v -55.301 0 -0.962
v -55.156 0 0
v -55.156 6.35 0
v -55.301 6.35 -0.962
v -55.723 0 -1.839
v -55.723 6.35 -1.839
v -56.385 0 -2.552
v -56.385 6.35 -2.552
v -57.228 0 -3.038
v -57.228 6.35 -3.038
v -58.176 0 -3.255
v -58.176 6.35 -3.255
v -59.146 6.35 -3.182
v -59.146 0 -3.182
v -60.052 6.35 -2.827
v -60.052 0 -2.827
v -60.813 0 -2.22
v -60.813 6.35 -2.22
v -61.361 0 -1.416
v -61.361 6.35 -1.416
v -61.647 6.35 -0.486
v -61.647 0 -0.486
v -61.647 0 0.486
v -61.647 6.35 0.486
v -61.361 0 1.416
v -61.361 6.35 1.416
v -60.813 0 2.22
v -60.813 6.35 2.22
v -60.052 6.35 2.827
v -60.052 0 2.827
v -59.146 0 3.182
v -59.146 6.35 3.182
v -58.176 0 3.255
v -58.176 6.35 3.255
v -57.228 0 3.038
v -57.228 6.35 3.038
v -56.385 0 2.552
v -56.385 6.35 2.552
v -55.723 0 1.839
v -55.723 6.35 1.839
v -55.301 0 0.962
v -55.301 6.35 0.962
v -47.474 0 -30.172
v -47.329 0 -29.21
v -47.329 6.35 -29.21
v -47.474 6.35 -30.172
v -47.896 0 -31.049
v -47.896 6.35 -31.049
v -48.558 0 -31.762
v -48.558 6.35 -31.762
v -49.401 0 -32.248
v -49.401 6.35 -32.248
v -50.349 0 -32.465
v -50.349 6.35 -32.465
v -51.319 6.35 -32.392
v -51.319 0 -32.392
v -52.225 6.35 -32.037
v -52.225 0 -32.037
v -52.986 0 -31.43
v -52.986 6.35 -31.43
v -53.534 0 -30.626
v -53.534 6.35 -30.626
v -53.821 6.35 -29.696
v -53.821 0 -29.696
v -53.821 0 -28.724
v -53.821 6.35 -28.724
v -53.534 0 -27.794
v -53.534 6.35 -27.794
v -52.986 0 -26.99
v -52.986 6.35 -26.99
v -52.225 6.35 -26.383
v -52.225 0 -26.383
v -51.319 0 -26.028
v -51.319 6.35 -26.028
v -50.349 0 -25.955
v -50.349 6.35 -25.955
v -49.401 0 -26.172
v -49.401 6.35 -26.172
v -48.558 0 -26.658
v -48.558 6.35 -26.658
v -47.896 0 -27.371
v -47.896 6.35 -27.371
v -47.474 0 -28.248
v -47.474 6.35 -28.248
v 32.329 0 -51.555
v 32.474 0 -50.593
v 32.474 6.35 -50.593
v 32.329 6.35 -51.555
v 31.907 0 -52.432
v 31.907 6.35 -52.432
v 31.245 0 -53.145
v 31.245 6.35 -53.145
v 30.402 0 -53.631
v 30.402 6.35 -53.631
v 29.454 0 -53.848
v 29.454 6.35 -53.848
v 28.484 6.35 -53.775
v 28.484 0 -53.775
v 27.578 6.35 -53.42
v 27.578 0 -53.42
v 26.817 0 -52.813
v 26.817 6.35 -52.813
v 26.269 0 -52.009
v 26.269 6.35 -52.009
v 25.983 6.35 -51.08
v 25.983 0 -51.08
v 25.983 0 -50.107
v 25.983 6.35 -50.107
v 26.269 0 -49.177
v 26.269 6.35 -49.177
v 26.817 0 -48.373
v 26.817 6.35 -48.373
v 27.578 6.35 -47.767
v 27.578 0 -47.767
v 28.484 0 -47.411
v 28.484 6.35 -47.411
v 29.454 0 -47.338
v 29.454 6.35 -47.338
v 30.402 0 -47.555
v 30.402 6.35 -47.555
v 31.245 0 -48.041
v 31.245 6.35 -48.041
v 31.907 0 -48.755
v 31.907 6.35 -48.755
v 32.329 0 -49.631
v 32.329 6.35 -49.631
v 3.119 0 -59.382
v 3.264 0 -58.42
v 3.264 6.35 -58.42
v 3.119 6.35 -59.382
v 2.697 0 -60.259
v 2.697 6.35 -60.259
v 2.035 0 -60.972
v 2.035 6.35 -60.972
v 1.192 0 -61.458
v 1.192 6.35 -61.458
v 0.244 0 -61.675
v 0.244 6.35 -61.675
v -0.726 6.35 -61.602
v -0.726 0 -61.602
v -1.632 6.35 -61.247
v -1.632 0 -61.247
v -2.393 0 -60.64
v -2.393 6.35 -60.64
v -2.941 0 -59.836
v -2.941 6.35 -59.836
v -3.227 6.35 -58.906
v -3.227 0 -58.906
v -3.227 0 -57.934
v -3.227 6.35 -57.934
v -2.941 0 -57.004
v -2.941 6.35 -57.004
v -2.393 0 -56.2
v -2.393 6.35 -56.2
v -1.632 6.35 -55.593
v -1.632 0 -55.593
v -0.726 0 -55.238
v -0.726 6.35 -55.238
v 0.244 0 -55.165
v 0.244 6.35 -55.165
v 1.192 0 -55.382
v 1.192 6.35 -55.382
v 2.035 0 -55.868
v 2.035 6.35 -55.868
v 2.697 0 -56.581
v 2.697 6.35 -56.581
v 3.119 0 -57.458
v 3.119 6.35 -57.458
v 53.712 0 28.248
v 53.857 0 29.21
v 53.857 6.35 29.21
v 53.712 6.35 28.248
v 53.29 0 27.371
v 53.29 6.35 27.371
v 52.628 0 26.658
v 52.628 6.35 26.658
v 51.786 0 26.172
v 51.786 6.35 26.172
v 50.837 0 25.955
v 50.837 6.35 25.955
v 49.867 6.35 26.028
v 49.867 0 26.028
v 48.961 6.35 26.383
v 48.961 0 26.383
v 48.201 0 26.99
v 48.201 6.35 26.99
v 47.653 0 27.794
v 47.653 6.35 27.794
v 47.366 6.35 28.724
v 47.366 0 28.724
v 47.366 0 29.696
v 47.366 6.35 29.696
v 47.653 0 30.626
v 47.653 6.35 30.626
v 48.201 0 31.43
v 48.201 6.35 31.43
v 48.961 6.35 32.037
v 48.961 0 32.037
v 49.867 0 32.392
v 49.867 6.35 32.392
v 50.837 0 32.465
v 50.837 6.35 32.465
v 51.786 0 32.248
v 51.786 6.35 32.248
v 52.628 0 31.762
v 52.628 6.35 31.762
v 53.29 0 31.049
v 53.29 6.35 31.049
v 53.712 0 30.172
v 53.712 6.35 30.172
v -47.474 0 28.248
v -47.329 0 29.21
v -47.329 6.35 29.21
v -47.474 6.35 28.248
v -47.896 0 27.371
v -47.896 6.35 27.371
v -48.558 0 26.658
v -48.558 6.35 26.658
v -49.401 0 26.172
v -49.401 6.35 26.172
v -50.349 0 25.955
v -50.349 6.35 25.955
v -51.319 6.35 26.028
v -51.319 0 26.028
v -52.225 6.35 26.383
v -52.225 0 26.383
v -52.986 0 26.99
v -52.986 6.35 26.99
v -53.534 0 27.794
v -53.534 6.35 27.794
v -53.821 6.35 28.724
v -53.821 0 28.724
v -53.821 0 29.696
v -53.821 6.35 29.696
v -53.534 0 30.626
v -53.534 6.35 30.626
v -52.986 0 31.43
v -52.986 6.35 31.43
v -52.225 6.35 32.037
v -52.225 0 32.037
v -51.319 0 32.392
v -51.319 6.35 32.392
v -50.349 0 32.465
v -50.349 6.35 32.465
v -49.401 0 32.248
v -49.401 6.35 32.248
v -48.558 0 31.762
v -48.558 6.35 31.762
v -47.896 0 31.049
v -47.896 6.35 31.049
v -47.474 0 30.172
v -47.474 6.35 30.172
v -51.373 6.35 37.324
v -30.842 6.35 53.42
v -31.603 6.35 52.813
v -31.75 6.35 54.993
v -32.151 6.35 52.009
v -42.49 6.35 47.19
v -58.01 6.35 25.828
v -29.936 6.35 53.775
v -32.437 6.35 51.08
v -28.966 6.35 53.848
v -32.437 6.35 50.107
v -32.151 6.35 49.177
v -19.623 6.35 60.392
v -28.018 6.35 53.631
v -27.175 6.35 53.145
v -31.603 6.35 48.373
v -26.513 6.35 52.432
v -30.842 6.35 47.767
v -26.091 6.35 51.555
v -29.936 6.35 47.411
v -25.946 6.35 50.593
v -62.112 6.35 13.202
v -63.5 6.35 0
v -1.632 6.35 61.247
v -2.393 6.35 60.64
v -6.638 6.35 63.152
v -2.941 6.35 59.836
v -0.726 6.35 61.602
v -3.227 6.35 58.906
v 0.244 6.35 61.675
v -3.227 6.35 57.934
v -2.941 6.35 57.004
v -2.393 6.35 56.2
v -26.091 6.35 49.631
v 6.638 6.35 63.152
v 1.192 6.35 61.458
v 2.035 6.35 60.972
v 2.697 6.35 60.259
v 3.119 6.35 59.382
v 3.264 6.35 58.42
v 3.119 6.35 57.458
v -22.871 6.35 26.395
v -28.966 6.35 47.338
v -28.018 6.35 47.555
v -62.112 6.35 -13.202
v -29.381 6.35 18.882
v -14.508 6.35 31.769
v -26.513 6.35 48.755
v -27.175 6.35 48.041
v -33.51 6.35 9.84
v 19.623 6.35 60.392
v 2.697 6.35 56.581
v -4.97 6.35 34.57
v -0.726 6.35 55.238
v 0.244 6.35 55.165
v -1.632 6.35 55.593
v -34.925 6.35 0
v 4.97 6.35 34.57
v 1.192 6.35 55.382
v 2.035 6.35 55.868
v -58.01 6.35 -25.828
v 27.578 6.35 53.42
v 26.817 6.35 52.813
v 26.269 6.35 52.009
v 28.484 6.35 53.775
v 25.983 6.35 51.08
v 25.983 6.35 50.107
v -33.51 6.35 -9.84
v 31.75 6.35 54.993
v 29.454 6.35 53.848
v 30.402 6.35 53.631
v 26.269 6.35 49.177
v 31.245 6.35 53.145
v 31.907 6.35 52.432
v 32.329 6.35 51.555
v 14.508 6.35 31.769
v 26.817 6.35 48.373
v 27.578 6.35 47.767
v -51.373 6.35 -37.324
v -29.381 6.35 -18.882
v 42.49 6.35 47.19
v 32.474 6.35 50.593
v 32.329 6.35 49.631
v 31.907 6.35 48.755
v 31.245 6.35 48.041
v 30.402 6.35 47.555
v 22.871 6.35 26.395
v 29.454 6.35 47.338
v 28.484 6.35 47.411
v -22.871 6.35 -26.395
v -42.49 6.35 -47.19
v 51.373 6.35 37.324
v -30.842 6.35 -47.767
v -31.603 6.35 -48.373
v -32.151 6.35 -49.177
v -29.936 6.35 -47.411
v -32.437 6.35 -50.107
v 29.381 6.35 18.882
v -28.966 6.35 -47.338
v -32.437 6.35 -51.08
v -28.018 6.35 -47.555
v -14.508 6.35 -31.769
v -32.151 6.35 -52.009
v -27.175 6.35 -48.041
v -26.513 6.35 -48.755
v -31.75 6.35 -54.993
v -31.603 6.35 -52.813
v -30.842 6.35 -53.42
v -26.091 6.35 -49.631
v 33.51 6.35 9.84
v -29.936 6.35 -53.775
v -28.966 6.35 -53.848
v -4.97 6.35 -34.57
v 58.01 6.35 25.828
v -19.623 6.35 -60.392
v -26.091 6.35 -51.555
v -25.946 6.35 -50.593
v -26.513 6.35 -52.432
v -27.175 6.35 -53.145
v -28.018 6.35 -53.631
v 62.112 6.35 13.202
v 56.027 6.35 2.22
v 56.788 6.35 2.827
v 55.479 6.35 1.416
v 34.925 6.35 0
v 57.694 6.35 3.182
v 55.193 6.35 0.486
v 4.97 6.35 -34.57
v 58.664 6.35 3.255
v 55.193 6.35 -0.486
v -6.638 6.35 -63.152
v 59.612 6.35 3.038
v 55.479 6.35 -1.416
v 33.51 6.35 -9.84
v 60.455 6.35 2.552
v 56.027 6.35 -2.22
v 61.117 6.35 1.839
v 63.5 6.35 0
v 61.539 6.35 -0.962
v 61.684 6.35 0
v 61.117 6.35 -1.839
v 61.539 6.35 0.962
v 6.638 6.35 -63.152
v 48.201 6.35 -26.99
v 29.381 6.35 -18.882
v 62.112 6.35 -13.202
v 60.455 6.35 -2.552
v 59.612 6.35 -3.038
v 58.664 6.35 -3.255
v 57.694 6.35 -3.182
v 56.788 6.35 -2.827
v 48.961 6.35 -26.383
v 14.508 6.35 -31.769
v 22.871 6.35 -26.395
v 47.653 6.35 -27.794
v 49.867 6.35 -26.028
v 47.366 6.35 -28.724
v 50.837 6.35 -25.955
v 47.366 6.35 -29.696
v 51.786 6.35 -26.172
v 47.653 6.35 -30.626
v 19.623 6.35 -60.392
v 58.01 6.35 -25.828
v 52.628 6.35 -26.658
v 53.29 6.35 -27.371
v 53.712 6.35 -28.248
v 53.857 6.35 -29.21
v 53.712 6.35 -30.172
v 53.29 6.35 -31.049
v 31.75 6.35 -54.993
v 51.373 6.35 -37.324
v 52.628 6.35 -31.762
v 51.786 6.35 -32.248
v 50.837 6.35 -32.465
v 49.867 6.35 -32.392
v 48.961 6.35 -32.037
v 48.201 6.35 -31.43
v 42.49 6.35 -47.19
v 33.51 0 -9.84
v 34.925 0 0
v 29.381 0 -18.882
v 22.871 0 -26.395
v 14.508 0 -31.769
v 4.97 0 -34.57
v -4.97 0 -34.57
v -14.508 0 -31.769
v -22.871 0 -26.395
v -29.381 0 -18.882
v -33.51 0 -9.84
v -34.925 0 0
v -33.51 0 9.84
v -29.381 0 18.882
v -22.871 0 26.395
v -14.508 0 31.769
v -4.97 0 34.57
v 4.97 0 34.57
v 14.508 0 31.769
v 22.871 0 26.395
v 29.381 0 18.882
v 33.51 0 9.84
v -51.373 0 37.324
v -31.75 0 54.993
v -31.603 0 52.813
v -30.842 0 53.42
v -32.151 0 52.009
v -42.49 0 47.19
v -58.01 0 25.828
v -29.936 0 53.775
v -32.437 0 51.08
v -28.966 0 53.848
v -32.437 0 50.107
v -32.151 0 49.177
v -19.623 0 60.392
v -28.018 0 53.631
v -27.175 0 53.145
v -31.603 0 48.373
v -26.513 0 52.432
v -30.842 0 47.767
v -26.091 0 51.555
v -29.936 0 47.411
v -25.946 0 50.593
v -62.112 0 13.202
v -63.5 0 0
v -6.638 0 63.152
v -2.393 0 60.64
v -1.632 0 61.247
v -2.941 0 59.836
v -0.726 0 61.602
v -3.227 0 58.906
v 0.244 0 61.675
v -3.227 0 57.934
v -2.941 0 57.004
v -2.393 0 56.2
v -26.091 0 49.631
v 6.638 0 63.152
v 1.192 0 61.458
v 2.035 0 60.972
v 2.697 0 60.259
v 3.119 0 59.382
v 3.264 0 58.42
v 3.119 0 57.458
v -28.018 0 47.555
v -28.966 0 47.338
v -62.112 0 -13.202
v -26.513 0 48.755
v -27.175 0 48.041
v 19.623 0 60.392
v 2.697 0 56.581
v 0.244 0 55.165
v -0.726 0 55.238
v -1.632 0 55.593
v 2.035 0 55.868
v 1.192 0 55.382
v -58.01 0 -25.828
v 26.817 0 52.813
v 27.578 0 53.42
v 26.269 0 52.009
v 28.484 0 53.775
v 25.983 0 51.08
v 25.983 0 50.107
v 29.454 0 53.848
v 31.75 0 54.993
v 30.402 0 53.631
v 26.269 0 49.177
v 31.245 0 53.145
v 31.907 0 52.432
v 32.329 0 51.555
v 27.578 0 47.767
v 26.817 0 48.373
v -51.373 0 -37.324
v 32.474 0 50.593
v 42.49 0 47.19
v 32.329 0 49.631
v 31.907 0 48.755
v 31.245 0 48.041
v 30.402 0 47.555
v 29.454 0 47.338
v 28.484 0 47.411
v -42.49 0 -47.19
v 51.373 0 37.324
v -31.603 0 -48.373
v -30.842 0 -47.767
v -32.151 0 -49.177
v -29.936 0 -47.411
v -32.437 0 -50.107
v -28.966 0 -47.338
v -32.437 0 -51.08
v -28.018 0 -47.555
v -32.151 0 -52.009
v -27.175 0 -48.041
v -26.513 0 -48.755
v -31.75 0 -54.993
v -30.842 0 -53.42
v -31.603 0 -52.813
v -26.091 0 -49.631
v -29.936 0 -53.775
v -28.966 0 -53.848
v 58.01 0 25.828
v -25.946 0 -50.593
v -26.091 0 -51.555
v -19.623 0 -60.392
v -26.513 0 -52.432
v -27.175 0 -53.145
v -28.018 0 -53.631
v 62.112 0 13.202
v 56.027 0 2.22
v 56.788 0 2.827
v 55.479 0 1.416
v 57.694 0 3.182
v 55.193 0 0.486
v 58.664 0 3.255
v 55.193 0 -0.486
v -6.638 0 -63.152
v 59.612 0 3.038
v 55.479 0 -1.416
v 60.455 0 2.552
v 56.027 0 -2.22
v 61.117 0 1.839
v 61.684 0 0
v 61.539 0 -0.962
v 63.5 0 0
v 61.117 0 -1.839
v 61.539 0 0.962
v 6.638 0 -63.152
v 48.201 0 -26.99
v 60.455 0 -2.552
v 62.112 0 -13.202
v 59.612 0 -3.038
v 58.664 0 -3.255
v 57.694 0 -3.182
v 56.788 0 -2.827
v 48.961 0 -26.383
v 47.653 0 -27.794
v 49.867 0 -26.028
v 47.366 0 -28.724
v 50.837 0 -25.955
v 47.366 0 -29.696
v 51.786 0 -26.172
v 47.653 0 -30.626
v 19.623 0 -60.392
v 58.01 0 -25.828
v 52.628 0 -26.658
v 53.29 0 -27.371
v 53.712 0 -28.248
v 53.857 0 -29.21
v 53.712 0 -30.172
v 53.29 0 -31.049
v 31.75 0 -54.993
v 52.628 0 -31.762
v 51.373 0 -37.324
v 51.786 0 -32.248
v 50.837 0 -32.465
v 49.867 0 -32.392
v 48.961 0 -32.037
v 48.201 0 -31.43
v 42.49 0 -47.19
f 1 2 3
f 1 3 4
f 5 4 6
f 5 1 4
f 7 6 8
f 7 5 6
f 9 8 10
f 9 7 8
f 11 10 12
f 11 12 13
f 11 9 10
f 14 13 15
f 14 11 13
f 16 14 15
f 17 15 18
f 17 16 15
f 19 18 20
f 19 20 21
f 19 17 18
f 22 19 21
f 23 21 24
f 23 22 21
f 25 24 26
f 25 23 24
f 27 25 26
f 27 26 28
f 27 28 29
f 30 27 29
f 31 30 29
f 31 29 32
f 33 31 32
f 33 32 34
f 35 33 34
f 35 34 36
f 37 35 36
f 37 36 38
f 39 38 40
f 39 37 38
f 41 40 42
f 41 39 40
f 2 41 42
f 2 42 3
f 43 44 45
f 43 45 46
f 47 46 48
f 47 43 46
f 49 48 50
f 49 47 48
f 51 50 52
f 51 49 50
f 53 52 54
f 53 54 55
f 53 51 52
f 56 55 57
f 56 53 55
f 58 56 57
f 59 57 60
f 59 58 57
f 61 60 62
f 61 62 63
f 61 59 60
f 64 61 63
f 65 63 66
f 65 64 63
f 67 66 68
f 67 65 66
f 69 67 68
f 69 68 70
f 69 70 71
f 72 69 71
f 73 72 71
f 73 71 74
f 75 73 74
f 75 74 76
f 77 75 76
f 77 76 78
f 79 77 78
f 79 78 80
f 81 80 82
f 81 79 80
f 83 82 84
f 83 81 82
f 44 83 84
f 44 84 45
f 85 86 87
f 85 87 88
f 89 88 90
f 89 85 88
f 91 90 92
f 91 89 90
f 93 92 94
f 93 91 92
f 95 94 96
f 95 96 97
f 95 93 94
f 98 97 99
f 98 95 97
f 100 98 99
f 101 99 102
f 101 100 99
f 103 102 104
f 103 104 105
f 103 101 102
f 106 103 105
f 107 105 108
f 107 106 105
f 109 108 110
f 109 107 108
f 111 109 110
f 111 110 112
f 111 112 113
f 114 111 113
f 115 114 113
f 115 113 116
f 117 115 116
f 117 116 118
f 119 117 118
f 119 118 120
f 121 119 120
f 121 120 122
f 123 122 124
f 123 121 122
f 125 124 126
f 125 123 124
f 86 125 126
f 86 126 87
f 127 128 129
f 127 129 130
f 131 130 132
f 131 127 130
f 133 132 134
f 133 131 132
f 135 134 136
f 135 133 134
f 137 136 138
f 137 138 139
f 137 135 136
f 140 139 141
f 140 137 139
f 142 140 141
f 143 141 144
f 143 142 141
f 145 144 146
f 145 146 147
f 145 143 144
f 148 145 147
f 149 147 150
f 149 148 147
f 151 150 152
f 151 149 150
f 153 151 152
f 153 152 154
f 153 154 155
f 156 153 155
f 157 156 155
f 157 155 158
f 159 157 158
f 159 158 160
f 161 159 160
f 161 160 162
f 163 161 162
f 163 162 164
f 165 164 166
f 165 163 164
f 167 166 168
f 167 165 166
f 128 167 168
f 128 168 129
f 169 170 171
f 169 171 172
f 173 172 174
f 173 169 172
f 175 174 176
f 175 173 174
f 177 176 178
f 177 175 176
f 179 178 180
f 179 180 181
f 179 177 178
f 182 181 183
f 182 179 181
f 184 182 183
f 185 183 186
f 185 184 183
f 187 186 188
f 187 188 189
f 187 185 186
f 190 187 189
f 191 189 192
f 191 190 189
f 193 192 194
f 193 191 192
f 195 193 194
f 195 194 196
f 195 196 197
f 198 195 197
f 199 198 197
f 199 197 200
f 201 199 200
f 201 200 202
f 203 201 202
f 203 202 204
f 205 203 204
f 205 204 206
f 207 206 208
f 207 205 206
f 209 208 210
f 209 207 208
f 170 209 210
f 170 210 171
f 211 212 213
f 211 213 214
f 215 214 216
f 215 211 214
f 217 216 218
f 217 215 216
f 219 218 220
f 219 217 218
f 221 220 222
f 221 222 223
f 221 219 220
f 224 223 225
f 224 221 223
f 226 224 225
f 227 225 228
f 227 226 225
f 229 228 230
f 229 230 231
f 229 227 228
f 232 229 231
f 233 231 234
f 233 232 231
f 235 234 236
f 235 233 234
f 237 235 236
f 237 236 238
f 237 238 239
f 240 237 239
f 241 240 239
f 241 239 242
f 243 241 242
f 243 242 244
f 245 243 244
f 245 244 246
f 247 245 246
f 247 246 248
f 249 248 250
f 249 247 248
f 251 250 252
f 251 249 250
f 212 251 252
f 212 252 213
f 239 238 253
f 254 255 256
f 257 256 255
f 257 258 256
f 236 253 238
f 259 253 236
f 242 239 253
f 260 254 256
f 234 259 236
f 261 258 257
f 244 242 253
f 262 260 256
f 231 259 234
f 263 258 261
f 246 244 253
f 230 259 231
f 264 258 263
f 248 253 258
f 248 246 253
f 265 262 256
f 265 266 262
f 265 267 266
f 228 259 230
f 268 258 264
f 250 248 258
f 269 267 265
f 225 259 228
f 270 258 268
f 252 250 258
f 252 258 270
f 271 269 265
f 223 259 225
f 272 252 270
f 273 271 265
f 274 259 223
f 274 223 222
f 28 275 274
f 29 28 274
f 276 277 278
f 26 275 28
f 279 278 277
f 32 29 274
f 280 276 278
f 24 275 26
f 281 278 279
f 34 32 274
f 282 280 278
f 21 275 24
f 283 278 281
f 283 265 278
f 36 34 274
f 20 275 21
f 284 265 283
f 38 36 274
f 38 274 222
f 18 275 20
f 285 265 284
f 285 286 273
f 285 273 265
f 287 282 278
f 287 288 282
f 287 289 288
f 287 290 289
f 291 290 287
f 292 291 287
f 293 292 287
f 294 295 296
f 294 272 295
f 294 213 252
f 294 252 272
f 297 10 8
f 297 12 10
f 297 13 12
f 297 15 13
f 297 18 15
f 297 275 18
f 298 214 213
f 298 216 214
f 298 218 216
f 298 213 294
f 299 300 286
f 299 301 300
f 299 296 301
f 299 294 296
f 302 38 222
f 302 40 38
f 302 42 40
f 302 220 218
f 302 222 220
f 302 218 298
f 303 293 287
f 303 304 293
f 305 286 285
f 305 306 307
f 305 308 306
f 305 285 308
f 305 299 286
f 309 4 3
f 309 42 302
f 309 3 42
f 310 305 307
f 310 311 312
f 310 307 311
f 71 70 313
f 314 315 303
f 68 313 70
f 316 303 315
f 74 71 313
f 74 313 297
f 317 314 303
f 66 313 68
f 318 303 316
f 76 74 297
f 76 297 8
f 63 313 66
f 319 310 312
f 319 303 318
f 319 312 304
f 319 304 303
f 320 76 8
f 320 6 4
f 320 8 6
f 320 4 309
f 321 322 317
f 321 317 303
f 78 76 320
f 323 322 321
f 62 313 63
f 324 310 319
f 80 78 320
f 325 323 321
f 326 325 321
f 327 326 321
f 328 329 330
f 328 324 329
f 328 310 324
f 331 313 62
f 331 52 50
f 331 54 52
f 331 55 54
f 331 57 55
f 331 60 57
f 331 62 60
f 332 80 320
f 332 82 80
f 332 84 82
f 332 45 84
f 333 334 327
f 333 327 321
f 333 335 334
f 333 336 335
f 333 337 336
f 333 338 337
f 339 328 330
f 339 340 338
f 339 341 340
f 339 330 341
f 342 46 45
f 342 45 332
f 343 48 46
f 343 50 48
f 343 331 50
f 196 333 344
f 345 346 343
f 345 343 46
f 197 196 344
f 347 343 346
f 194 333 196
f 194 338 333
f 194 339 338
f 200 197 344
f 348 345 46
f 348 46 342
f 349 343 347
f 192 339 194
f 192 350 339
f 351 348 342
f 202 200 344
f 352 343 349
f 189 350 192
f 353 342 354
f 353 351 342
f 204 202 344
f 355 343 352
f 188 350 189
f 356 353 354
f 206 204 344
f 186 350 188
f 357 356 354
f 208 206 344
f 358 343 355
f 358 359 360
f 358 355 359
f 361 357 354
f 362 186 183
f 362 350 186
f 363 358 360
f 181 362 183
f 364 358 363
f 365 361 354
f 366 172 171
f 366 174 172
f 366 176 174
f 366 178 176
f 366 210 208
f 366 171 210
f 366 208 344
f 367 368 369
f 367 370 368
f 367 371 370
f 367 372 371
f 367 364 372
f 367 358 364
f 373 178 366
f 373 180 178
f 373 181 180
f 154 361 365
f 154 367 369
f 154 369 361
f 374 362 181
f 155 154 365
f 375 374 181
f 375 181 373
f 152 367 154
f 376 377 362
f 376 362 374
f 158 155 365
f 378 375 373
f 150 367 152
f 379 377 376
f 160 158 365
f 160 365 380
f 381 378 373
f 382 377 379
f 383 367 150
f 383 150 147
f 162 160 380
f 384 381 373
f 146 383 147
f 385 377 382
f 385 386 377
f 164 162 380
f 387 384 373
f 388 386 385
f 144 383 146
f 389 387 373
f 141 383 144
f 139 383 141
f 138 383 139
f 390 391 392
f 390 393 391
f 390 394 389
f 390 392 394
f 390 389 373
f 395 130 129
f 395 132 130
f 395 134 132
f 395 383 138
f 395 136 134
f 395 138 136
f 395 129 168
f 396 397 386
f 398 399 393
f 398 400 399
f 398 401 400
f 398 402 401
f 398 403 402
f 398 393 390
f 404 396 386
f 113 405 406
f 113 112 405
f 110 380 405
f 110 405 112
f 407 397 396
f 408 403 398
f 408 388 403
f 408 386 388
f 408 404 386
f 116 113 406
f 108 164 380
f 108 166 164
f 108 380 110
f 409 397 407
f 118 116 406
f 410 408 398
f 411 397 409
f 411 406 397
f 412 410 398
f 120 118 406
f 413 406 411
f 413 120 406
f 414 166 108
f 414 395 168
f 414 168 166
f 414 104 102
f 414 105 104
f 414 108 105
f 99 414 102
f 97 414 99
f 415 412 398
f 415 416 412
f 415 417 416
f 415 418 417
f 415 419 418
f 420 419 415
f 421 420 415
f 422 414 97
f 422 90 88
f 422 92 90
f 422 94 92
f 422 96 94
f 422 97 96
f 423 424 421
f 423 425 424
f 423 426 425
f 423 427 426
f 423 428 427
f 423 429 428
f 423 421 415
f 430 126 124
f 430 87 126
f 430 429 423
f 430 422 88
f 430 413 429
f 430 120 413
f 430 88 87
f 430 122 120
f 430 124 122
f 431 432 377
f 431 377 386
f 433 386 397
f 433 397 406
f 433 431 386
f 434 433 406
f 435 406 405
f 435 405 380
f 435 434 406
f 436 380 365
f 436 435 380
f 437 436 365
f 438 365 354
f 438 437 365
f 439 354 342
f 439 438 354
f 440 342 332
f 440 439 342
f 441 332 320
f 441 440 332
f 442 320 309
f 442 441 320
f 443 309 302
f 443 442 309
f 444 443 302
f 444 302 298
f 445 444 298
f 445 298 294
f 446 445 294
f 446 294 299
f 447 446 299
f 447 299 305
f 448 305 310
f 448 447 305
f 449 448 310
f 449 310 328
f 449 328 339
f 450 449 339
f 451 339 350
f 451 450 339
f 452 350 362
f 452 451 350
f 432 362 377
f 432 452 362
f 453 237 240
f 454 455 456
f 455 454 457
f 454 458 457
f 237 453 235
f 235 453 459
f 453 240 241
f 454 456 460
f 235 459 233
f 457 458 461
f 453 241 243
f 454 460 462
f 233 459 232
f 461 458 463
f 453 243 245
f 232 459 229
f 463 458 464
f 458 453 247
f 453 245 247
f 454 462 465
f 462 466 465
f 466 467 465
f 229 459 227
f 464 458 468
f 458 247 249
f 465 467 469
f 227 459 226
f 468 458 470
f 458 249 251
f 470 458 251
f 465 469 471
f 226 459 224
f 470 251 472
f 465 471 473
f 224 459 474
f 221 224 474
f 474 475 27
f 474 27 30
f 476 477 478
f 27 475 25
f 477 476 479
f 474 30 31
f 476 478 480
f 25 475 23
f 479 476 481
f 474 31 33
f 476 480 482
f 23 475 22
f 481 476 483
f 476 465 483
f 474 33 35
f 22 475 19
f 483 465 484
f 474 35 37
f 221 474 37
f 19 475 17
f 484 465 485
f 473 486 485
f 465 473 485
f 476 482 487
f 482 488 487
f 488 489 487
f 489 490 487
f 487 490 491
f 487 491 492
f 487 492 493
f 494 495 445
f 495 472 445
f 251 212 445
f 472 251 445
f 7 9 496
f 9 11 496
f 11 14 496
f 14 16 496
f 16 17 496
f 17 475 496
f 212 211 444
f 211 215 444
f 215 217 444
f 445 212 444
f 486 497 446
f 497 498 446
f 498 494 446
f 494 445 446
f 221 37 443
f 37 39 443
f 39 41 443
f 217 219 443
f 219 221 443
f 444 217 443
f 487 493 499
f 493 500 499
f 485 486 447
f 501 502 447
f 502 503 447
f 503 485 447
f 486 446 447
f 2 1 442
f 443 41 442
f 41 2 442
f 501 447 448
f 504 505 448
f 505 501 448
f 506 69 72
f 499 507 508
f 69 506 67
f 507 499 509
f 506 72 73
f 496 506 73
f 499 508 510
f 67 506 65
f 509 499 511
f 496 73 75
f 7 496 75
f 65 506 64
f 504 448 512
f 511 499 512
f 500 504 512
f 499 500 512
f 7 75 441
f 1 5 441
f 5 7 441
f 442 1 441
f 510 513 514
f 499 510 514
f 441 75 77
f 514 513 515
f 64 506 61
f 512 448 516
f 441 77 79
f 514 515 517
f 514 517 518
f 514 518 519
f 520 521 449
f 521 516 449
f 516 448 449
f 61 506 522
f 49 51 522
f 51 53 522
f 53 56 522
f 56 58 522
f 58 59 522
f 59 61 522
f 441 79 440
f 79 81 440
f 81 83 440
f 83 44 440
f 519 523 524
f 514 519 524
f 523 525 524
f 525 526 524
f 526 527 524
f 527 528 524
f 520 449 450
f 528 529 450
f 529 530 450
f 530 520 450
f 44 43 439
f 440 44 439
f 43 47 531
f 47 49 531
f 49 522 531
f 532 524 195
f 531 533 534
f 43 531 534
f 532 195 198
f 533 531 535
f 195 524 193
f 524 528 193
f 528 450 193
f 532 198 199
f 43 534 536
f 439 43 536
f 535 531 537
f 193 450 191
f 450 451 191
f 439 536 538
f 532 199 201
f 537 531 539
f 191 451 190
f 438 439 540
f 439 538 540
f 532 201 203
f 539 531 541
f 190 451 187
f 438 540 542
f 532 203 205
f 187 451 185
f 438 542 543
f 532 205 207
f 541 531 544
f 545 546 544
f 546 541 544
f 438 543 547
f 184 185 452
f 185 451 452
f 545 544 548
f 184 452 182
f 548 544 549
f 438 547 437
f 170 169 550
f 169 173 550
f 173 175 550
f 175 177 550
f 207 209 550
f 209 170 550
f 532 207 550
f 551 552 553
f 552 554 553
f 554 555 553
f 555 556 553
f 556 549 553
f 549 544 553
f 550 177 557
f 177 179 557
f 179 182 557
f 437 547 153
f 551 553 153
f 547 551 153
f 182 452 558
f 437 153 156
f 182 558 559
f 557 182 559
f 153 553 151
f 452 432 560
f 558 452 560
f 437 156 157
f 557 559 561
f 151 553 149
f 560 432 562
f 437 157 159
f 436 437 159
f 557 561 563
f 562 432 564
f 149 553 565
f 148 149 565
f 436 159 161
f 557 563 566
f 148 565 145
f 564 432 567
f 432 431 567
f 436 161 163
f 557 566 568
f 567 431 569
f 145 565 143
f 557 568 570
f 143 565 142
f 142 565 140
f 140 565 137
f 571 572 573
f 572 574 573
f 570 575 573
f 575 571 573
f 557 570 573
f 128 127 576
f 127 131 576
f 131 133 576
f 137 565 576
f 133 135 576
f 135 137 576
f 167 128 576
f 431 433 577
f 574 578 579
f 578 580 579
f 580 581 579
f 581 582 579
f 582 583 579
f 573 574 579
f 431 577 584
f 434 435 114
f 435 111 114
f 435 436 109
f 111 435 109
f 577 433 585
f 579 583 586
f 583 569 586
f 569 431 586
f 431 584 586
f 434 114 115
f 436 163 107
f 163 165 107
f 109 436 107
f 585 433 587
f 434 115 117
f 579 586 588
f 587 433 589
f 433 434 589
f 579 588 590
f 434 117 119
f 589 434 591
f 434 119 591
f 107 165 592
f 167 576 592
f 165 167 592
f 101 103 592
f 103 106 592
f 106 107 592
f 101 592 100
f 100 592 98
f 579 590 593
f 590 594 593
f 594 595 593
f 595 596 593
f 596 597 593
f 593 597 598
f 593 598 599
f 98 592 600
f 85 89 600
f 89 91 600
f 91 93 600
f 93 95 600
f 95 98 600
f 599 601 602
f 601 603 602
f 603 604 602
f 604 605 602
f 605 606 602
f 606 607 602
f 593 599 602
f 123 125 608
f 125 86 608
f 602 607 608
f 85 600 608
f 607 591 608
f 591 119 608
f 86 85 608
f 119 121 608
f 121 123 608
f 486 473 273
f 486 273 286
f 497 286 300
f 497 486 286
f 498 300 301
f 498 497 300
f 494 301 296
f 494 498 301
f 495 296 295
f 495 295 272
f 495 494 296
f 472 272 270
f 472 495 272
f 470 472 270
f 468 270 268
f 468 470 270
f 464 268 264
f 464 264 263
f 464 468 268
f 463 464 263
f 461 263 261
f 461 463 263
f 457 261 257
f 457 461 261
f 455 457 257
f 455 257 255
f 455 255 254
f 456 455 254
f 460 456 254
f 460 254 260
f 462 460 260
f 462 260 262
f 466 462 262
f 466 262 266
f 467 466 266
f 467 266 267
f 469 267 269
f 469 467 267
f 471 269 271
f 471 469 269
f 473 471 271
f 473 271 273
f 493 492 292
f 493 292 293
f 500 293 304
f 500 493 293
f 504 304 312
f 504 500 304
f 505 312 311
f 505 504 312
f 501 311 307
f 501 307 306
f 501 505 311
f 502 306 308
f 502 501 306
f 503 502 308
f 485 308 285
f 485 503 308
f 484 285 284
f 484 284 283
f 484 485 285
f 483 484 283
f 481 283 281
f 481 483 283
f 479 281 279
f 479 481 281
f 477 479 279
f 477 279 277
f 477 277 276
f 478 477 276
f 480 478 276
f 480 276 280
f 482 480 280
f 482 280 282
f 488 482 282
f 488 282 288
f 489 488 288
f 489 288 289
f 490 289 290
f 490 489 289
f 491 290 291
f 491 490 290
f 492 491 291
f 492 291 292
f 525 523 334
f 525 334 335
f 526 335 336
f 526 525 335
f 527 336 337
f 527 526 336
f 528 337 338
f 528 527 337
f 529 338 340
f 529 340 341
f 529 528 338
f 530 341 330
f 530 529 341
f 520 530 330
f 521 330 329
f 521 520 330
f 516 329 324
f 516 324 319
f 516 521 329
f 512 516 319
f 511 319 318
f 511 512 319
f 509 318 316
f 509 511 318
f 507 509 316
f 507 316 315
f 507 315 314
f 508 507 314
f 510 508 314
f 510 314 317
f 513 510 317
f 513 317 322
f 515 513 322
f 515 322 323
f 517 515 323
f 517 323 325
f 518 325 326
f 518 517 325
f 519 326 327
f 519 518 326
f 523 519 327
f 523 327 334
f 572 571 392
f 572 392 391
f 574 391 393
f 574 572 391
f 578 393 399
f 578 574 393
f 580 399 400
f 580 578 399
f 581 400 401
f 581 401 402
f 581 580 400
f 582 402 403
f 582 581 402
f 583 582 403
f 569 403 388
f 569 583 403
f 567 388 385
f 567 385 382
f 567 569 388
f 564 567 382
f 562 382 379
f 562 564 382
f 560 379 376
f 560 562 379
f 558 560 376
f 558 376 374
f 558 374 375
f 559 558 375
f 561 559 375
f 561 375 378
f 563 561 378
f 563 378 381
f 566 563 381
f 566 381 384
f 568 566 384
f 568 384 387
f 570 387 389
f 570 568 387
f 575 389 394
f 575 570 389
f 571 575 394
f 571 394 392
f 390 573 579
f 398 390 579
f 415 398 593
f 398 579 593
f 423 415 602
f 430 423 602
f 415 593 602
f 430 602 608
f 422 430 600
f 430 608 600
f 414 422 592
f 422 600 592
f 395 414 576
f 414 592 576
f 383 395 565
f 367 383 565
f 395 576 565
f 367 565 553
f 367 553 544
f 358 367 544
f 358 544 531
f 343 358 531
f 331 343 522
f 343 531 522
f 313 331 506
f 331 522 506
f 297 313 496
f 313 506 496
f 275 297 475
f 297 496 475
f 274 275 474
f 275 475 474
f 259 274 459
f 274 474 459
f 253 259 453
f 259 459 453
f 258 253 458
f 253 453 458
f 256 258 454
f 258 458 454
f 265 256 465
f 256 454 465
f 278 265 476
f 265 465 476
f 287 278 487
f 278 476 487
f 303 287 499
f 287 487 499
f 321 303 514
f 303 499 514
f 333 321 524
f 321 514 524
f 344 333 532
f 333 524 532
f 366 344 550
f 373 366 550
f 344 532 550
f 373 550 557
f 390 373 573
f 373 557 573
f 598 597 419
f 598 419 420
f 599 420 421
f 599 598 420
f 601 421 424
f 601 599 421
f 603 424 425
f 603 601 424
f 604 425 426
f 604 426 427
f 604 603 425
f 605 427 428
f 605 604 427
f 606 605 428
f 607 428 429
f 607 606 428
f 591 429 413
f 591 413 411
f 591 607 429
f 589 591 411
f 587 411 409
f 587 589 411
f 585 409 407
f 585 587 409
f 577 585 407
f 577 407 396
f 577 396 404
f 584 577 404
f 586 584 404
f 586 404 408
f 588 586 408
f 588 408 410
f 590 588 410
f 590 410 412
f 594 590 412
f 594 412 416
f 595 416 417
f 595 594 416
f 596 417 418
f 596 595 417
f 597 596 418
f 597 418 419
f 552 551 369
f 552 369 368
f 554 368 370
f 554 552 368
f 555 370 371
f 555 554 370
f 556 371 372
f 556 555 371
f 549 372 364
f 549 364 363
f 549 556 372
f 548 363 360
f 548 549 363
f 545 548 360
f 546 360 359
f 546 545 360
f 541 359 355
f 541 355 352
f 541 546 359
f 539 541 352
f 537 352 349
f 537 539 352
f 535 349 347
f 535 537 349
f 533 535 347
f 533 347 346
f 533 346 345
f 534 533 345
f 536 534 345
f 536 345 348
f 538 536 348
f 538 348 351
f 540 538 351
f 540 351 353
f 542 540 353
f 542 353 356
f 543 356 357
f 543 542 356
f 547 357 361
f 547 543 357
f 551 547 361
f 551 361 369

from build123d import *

# Parameters (mm, degrees)
SKETCH1_R           = 63.5
SKETCH1_R_2         = 34.925
SKETCH1_R_3         = 3.2639
BOSS_EXTRUDE1_DEPTH = 6.35


with BuildPart() as part:
    # Sketch1 → Boss-Extrude1 (new body)
    with BuildSketch(Plane(origin=(0, 0, 0), x_dir=(1, 0, 0), z_dir=(0, 1, 0))):
        Circle(SKETCH1_R)
        Circle(SKETCH1_R_2, mode=Mode.SUBTRACT)
        with Locations((0, 58.42)):
            Circle(SKETCH1_R_3, mode=Mode.SUBTRACT)
        with Locations((29.21, 50.593204089)):
            Circle(SKETCH1_R_3, mode=Mode.SUBTRACT)
        with Locations((50.593204089, 29.21)):
            Circle(SKETCH1_R_3, mode=Mode.SUBTRACT)
        with Locations((58.42, 0)):
            Circle(SKETCH1_R_3, mode=Mode.SUBTRACT)
        with Locations((50.593204089, -29.21)):
            Circle(SKETCH1_R_3, mode=Mode.SUBTRACT)
        with Locations((29.21, -50.593204089)):
            Circle(SKETCH1_R_3, mode=Mode.SUBTRACT)
        with Locations((0, -58.42)):
            Circle(SKETCH1_R_3, mode=Mode.SUBTRACT)
        with Locations((-29.21, -50.593204089)):
            Circle(SKETCH1_R_3, mode=Mode.SUBTRACT)
        with Locations((-50.593204089, -29.21)):
            Circle(SKETCH1_R_3, mode=Mode.SUBTRACT)
        with Locations((-58.42, 0)):
            Circle(SKETCH1_R_3, mode=Mode.SUBTRACT)
        with Locations((-50.593204089, 29.21)):
            Circle(SKETCH1_R_3, mode=Mode.SUBTRACT)
        with Locations((-29.21, 50.593204089)):
            Circle(SKETCH1_R_3, mode=Mode.SUBTRACT)
    extrude(amount=BOSS_EXTRUDE1_DEPTH)


solid = part.part
